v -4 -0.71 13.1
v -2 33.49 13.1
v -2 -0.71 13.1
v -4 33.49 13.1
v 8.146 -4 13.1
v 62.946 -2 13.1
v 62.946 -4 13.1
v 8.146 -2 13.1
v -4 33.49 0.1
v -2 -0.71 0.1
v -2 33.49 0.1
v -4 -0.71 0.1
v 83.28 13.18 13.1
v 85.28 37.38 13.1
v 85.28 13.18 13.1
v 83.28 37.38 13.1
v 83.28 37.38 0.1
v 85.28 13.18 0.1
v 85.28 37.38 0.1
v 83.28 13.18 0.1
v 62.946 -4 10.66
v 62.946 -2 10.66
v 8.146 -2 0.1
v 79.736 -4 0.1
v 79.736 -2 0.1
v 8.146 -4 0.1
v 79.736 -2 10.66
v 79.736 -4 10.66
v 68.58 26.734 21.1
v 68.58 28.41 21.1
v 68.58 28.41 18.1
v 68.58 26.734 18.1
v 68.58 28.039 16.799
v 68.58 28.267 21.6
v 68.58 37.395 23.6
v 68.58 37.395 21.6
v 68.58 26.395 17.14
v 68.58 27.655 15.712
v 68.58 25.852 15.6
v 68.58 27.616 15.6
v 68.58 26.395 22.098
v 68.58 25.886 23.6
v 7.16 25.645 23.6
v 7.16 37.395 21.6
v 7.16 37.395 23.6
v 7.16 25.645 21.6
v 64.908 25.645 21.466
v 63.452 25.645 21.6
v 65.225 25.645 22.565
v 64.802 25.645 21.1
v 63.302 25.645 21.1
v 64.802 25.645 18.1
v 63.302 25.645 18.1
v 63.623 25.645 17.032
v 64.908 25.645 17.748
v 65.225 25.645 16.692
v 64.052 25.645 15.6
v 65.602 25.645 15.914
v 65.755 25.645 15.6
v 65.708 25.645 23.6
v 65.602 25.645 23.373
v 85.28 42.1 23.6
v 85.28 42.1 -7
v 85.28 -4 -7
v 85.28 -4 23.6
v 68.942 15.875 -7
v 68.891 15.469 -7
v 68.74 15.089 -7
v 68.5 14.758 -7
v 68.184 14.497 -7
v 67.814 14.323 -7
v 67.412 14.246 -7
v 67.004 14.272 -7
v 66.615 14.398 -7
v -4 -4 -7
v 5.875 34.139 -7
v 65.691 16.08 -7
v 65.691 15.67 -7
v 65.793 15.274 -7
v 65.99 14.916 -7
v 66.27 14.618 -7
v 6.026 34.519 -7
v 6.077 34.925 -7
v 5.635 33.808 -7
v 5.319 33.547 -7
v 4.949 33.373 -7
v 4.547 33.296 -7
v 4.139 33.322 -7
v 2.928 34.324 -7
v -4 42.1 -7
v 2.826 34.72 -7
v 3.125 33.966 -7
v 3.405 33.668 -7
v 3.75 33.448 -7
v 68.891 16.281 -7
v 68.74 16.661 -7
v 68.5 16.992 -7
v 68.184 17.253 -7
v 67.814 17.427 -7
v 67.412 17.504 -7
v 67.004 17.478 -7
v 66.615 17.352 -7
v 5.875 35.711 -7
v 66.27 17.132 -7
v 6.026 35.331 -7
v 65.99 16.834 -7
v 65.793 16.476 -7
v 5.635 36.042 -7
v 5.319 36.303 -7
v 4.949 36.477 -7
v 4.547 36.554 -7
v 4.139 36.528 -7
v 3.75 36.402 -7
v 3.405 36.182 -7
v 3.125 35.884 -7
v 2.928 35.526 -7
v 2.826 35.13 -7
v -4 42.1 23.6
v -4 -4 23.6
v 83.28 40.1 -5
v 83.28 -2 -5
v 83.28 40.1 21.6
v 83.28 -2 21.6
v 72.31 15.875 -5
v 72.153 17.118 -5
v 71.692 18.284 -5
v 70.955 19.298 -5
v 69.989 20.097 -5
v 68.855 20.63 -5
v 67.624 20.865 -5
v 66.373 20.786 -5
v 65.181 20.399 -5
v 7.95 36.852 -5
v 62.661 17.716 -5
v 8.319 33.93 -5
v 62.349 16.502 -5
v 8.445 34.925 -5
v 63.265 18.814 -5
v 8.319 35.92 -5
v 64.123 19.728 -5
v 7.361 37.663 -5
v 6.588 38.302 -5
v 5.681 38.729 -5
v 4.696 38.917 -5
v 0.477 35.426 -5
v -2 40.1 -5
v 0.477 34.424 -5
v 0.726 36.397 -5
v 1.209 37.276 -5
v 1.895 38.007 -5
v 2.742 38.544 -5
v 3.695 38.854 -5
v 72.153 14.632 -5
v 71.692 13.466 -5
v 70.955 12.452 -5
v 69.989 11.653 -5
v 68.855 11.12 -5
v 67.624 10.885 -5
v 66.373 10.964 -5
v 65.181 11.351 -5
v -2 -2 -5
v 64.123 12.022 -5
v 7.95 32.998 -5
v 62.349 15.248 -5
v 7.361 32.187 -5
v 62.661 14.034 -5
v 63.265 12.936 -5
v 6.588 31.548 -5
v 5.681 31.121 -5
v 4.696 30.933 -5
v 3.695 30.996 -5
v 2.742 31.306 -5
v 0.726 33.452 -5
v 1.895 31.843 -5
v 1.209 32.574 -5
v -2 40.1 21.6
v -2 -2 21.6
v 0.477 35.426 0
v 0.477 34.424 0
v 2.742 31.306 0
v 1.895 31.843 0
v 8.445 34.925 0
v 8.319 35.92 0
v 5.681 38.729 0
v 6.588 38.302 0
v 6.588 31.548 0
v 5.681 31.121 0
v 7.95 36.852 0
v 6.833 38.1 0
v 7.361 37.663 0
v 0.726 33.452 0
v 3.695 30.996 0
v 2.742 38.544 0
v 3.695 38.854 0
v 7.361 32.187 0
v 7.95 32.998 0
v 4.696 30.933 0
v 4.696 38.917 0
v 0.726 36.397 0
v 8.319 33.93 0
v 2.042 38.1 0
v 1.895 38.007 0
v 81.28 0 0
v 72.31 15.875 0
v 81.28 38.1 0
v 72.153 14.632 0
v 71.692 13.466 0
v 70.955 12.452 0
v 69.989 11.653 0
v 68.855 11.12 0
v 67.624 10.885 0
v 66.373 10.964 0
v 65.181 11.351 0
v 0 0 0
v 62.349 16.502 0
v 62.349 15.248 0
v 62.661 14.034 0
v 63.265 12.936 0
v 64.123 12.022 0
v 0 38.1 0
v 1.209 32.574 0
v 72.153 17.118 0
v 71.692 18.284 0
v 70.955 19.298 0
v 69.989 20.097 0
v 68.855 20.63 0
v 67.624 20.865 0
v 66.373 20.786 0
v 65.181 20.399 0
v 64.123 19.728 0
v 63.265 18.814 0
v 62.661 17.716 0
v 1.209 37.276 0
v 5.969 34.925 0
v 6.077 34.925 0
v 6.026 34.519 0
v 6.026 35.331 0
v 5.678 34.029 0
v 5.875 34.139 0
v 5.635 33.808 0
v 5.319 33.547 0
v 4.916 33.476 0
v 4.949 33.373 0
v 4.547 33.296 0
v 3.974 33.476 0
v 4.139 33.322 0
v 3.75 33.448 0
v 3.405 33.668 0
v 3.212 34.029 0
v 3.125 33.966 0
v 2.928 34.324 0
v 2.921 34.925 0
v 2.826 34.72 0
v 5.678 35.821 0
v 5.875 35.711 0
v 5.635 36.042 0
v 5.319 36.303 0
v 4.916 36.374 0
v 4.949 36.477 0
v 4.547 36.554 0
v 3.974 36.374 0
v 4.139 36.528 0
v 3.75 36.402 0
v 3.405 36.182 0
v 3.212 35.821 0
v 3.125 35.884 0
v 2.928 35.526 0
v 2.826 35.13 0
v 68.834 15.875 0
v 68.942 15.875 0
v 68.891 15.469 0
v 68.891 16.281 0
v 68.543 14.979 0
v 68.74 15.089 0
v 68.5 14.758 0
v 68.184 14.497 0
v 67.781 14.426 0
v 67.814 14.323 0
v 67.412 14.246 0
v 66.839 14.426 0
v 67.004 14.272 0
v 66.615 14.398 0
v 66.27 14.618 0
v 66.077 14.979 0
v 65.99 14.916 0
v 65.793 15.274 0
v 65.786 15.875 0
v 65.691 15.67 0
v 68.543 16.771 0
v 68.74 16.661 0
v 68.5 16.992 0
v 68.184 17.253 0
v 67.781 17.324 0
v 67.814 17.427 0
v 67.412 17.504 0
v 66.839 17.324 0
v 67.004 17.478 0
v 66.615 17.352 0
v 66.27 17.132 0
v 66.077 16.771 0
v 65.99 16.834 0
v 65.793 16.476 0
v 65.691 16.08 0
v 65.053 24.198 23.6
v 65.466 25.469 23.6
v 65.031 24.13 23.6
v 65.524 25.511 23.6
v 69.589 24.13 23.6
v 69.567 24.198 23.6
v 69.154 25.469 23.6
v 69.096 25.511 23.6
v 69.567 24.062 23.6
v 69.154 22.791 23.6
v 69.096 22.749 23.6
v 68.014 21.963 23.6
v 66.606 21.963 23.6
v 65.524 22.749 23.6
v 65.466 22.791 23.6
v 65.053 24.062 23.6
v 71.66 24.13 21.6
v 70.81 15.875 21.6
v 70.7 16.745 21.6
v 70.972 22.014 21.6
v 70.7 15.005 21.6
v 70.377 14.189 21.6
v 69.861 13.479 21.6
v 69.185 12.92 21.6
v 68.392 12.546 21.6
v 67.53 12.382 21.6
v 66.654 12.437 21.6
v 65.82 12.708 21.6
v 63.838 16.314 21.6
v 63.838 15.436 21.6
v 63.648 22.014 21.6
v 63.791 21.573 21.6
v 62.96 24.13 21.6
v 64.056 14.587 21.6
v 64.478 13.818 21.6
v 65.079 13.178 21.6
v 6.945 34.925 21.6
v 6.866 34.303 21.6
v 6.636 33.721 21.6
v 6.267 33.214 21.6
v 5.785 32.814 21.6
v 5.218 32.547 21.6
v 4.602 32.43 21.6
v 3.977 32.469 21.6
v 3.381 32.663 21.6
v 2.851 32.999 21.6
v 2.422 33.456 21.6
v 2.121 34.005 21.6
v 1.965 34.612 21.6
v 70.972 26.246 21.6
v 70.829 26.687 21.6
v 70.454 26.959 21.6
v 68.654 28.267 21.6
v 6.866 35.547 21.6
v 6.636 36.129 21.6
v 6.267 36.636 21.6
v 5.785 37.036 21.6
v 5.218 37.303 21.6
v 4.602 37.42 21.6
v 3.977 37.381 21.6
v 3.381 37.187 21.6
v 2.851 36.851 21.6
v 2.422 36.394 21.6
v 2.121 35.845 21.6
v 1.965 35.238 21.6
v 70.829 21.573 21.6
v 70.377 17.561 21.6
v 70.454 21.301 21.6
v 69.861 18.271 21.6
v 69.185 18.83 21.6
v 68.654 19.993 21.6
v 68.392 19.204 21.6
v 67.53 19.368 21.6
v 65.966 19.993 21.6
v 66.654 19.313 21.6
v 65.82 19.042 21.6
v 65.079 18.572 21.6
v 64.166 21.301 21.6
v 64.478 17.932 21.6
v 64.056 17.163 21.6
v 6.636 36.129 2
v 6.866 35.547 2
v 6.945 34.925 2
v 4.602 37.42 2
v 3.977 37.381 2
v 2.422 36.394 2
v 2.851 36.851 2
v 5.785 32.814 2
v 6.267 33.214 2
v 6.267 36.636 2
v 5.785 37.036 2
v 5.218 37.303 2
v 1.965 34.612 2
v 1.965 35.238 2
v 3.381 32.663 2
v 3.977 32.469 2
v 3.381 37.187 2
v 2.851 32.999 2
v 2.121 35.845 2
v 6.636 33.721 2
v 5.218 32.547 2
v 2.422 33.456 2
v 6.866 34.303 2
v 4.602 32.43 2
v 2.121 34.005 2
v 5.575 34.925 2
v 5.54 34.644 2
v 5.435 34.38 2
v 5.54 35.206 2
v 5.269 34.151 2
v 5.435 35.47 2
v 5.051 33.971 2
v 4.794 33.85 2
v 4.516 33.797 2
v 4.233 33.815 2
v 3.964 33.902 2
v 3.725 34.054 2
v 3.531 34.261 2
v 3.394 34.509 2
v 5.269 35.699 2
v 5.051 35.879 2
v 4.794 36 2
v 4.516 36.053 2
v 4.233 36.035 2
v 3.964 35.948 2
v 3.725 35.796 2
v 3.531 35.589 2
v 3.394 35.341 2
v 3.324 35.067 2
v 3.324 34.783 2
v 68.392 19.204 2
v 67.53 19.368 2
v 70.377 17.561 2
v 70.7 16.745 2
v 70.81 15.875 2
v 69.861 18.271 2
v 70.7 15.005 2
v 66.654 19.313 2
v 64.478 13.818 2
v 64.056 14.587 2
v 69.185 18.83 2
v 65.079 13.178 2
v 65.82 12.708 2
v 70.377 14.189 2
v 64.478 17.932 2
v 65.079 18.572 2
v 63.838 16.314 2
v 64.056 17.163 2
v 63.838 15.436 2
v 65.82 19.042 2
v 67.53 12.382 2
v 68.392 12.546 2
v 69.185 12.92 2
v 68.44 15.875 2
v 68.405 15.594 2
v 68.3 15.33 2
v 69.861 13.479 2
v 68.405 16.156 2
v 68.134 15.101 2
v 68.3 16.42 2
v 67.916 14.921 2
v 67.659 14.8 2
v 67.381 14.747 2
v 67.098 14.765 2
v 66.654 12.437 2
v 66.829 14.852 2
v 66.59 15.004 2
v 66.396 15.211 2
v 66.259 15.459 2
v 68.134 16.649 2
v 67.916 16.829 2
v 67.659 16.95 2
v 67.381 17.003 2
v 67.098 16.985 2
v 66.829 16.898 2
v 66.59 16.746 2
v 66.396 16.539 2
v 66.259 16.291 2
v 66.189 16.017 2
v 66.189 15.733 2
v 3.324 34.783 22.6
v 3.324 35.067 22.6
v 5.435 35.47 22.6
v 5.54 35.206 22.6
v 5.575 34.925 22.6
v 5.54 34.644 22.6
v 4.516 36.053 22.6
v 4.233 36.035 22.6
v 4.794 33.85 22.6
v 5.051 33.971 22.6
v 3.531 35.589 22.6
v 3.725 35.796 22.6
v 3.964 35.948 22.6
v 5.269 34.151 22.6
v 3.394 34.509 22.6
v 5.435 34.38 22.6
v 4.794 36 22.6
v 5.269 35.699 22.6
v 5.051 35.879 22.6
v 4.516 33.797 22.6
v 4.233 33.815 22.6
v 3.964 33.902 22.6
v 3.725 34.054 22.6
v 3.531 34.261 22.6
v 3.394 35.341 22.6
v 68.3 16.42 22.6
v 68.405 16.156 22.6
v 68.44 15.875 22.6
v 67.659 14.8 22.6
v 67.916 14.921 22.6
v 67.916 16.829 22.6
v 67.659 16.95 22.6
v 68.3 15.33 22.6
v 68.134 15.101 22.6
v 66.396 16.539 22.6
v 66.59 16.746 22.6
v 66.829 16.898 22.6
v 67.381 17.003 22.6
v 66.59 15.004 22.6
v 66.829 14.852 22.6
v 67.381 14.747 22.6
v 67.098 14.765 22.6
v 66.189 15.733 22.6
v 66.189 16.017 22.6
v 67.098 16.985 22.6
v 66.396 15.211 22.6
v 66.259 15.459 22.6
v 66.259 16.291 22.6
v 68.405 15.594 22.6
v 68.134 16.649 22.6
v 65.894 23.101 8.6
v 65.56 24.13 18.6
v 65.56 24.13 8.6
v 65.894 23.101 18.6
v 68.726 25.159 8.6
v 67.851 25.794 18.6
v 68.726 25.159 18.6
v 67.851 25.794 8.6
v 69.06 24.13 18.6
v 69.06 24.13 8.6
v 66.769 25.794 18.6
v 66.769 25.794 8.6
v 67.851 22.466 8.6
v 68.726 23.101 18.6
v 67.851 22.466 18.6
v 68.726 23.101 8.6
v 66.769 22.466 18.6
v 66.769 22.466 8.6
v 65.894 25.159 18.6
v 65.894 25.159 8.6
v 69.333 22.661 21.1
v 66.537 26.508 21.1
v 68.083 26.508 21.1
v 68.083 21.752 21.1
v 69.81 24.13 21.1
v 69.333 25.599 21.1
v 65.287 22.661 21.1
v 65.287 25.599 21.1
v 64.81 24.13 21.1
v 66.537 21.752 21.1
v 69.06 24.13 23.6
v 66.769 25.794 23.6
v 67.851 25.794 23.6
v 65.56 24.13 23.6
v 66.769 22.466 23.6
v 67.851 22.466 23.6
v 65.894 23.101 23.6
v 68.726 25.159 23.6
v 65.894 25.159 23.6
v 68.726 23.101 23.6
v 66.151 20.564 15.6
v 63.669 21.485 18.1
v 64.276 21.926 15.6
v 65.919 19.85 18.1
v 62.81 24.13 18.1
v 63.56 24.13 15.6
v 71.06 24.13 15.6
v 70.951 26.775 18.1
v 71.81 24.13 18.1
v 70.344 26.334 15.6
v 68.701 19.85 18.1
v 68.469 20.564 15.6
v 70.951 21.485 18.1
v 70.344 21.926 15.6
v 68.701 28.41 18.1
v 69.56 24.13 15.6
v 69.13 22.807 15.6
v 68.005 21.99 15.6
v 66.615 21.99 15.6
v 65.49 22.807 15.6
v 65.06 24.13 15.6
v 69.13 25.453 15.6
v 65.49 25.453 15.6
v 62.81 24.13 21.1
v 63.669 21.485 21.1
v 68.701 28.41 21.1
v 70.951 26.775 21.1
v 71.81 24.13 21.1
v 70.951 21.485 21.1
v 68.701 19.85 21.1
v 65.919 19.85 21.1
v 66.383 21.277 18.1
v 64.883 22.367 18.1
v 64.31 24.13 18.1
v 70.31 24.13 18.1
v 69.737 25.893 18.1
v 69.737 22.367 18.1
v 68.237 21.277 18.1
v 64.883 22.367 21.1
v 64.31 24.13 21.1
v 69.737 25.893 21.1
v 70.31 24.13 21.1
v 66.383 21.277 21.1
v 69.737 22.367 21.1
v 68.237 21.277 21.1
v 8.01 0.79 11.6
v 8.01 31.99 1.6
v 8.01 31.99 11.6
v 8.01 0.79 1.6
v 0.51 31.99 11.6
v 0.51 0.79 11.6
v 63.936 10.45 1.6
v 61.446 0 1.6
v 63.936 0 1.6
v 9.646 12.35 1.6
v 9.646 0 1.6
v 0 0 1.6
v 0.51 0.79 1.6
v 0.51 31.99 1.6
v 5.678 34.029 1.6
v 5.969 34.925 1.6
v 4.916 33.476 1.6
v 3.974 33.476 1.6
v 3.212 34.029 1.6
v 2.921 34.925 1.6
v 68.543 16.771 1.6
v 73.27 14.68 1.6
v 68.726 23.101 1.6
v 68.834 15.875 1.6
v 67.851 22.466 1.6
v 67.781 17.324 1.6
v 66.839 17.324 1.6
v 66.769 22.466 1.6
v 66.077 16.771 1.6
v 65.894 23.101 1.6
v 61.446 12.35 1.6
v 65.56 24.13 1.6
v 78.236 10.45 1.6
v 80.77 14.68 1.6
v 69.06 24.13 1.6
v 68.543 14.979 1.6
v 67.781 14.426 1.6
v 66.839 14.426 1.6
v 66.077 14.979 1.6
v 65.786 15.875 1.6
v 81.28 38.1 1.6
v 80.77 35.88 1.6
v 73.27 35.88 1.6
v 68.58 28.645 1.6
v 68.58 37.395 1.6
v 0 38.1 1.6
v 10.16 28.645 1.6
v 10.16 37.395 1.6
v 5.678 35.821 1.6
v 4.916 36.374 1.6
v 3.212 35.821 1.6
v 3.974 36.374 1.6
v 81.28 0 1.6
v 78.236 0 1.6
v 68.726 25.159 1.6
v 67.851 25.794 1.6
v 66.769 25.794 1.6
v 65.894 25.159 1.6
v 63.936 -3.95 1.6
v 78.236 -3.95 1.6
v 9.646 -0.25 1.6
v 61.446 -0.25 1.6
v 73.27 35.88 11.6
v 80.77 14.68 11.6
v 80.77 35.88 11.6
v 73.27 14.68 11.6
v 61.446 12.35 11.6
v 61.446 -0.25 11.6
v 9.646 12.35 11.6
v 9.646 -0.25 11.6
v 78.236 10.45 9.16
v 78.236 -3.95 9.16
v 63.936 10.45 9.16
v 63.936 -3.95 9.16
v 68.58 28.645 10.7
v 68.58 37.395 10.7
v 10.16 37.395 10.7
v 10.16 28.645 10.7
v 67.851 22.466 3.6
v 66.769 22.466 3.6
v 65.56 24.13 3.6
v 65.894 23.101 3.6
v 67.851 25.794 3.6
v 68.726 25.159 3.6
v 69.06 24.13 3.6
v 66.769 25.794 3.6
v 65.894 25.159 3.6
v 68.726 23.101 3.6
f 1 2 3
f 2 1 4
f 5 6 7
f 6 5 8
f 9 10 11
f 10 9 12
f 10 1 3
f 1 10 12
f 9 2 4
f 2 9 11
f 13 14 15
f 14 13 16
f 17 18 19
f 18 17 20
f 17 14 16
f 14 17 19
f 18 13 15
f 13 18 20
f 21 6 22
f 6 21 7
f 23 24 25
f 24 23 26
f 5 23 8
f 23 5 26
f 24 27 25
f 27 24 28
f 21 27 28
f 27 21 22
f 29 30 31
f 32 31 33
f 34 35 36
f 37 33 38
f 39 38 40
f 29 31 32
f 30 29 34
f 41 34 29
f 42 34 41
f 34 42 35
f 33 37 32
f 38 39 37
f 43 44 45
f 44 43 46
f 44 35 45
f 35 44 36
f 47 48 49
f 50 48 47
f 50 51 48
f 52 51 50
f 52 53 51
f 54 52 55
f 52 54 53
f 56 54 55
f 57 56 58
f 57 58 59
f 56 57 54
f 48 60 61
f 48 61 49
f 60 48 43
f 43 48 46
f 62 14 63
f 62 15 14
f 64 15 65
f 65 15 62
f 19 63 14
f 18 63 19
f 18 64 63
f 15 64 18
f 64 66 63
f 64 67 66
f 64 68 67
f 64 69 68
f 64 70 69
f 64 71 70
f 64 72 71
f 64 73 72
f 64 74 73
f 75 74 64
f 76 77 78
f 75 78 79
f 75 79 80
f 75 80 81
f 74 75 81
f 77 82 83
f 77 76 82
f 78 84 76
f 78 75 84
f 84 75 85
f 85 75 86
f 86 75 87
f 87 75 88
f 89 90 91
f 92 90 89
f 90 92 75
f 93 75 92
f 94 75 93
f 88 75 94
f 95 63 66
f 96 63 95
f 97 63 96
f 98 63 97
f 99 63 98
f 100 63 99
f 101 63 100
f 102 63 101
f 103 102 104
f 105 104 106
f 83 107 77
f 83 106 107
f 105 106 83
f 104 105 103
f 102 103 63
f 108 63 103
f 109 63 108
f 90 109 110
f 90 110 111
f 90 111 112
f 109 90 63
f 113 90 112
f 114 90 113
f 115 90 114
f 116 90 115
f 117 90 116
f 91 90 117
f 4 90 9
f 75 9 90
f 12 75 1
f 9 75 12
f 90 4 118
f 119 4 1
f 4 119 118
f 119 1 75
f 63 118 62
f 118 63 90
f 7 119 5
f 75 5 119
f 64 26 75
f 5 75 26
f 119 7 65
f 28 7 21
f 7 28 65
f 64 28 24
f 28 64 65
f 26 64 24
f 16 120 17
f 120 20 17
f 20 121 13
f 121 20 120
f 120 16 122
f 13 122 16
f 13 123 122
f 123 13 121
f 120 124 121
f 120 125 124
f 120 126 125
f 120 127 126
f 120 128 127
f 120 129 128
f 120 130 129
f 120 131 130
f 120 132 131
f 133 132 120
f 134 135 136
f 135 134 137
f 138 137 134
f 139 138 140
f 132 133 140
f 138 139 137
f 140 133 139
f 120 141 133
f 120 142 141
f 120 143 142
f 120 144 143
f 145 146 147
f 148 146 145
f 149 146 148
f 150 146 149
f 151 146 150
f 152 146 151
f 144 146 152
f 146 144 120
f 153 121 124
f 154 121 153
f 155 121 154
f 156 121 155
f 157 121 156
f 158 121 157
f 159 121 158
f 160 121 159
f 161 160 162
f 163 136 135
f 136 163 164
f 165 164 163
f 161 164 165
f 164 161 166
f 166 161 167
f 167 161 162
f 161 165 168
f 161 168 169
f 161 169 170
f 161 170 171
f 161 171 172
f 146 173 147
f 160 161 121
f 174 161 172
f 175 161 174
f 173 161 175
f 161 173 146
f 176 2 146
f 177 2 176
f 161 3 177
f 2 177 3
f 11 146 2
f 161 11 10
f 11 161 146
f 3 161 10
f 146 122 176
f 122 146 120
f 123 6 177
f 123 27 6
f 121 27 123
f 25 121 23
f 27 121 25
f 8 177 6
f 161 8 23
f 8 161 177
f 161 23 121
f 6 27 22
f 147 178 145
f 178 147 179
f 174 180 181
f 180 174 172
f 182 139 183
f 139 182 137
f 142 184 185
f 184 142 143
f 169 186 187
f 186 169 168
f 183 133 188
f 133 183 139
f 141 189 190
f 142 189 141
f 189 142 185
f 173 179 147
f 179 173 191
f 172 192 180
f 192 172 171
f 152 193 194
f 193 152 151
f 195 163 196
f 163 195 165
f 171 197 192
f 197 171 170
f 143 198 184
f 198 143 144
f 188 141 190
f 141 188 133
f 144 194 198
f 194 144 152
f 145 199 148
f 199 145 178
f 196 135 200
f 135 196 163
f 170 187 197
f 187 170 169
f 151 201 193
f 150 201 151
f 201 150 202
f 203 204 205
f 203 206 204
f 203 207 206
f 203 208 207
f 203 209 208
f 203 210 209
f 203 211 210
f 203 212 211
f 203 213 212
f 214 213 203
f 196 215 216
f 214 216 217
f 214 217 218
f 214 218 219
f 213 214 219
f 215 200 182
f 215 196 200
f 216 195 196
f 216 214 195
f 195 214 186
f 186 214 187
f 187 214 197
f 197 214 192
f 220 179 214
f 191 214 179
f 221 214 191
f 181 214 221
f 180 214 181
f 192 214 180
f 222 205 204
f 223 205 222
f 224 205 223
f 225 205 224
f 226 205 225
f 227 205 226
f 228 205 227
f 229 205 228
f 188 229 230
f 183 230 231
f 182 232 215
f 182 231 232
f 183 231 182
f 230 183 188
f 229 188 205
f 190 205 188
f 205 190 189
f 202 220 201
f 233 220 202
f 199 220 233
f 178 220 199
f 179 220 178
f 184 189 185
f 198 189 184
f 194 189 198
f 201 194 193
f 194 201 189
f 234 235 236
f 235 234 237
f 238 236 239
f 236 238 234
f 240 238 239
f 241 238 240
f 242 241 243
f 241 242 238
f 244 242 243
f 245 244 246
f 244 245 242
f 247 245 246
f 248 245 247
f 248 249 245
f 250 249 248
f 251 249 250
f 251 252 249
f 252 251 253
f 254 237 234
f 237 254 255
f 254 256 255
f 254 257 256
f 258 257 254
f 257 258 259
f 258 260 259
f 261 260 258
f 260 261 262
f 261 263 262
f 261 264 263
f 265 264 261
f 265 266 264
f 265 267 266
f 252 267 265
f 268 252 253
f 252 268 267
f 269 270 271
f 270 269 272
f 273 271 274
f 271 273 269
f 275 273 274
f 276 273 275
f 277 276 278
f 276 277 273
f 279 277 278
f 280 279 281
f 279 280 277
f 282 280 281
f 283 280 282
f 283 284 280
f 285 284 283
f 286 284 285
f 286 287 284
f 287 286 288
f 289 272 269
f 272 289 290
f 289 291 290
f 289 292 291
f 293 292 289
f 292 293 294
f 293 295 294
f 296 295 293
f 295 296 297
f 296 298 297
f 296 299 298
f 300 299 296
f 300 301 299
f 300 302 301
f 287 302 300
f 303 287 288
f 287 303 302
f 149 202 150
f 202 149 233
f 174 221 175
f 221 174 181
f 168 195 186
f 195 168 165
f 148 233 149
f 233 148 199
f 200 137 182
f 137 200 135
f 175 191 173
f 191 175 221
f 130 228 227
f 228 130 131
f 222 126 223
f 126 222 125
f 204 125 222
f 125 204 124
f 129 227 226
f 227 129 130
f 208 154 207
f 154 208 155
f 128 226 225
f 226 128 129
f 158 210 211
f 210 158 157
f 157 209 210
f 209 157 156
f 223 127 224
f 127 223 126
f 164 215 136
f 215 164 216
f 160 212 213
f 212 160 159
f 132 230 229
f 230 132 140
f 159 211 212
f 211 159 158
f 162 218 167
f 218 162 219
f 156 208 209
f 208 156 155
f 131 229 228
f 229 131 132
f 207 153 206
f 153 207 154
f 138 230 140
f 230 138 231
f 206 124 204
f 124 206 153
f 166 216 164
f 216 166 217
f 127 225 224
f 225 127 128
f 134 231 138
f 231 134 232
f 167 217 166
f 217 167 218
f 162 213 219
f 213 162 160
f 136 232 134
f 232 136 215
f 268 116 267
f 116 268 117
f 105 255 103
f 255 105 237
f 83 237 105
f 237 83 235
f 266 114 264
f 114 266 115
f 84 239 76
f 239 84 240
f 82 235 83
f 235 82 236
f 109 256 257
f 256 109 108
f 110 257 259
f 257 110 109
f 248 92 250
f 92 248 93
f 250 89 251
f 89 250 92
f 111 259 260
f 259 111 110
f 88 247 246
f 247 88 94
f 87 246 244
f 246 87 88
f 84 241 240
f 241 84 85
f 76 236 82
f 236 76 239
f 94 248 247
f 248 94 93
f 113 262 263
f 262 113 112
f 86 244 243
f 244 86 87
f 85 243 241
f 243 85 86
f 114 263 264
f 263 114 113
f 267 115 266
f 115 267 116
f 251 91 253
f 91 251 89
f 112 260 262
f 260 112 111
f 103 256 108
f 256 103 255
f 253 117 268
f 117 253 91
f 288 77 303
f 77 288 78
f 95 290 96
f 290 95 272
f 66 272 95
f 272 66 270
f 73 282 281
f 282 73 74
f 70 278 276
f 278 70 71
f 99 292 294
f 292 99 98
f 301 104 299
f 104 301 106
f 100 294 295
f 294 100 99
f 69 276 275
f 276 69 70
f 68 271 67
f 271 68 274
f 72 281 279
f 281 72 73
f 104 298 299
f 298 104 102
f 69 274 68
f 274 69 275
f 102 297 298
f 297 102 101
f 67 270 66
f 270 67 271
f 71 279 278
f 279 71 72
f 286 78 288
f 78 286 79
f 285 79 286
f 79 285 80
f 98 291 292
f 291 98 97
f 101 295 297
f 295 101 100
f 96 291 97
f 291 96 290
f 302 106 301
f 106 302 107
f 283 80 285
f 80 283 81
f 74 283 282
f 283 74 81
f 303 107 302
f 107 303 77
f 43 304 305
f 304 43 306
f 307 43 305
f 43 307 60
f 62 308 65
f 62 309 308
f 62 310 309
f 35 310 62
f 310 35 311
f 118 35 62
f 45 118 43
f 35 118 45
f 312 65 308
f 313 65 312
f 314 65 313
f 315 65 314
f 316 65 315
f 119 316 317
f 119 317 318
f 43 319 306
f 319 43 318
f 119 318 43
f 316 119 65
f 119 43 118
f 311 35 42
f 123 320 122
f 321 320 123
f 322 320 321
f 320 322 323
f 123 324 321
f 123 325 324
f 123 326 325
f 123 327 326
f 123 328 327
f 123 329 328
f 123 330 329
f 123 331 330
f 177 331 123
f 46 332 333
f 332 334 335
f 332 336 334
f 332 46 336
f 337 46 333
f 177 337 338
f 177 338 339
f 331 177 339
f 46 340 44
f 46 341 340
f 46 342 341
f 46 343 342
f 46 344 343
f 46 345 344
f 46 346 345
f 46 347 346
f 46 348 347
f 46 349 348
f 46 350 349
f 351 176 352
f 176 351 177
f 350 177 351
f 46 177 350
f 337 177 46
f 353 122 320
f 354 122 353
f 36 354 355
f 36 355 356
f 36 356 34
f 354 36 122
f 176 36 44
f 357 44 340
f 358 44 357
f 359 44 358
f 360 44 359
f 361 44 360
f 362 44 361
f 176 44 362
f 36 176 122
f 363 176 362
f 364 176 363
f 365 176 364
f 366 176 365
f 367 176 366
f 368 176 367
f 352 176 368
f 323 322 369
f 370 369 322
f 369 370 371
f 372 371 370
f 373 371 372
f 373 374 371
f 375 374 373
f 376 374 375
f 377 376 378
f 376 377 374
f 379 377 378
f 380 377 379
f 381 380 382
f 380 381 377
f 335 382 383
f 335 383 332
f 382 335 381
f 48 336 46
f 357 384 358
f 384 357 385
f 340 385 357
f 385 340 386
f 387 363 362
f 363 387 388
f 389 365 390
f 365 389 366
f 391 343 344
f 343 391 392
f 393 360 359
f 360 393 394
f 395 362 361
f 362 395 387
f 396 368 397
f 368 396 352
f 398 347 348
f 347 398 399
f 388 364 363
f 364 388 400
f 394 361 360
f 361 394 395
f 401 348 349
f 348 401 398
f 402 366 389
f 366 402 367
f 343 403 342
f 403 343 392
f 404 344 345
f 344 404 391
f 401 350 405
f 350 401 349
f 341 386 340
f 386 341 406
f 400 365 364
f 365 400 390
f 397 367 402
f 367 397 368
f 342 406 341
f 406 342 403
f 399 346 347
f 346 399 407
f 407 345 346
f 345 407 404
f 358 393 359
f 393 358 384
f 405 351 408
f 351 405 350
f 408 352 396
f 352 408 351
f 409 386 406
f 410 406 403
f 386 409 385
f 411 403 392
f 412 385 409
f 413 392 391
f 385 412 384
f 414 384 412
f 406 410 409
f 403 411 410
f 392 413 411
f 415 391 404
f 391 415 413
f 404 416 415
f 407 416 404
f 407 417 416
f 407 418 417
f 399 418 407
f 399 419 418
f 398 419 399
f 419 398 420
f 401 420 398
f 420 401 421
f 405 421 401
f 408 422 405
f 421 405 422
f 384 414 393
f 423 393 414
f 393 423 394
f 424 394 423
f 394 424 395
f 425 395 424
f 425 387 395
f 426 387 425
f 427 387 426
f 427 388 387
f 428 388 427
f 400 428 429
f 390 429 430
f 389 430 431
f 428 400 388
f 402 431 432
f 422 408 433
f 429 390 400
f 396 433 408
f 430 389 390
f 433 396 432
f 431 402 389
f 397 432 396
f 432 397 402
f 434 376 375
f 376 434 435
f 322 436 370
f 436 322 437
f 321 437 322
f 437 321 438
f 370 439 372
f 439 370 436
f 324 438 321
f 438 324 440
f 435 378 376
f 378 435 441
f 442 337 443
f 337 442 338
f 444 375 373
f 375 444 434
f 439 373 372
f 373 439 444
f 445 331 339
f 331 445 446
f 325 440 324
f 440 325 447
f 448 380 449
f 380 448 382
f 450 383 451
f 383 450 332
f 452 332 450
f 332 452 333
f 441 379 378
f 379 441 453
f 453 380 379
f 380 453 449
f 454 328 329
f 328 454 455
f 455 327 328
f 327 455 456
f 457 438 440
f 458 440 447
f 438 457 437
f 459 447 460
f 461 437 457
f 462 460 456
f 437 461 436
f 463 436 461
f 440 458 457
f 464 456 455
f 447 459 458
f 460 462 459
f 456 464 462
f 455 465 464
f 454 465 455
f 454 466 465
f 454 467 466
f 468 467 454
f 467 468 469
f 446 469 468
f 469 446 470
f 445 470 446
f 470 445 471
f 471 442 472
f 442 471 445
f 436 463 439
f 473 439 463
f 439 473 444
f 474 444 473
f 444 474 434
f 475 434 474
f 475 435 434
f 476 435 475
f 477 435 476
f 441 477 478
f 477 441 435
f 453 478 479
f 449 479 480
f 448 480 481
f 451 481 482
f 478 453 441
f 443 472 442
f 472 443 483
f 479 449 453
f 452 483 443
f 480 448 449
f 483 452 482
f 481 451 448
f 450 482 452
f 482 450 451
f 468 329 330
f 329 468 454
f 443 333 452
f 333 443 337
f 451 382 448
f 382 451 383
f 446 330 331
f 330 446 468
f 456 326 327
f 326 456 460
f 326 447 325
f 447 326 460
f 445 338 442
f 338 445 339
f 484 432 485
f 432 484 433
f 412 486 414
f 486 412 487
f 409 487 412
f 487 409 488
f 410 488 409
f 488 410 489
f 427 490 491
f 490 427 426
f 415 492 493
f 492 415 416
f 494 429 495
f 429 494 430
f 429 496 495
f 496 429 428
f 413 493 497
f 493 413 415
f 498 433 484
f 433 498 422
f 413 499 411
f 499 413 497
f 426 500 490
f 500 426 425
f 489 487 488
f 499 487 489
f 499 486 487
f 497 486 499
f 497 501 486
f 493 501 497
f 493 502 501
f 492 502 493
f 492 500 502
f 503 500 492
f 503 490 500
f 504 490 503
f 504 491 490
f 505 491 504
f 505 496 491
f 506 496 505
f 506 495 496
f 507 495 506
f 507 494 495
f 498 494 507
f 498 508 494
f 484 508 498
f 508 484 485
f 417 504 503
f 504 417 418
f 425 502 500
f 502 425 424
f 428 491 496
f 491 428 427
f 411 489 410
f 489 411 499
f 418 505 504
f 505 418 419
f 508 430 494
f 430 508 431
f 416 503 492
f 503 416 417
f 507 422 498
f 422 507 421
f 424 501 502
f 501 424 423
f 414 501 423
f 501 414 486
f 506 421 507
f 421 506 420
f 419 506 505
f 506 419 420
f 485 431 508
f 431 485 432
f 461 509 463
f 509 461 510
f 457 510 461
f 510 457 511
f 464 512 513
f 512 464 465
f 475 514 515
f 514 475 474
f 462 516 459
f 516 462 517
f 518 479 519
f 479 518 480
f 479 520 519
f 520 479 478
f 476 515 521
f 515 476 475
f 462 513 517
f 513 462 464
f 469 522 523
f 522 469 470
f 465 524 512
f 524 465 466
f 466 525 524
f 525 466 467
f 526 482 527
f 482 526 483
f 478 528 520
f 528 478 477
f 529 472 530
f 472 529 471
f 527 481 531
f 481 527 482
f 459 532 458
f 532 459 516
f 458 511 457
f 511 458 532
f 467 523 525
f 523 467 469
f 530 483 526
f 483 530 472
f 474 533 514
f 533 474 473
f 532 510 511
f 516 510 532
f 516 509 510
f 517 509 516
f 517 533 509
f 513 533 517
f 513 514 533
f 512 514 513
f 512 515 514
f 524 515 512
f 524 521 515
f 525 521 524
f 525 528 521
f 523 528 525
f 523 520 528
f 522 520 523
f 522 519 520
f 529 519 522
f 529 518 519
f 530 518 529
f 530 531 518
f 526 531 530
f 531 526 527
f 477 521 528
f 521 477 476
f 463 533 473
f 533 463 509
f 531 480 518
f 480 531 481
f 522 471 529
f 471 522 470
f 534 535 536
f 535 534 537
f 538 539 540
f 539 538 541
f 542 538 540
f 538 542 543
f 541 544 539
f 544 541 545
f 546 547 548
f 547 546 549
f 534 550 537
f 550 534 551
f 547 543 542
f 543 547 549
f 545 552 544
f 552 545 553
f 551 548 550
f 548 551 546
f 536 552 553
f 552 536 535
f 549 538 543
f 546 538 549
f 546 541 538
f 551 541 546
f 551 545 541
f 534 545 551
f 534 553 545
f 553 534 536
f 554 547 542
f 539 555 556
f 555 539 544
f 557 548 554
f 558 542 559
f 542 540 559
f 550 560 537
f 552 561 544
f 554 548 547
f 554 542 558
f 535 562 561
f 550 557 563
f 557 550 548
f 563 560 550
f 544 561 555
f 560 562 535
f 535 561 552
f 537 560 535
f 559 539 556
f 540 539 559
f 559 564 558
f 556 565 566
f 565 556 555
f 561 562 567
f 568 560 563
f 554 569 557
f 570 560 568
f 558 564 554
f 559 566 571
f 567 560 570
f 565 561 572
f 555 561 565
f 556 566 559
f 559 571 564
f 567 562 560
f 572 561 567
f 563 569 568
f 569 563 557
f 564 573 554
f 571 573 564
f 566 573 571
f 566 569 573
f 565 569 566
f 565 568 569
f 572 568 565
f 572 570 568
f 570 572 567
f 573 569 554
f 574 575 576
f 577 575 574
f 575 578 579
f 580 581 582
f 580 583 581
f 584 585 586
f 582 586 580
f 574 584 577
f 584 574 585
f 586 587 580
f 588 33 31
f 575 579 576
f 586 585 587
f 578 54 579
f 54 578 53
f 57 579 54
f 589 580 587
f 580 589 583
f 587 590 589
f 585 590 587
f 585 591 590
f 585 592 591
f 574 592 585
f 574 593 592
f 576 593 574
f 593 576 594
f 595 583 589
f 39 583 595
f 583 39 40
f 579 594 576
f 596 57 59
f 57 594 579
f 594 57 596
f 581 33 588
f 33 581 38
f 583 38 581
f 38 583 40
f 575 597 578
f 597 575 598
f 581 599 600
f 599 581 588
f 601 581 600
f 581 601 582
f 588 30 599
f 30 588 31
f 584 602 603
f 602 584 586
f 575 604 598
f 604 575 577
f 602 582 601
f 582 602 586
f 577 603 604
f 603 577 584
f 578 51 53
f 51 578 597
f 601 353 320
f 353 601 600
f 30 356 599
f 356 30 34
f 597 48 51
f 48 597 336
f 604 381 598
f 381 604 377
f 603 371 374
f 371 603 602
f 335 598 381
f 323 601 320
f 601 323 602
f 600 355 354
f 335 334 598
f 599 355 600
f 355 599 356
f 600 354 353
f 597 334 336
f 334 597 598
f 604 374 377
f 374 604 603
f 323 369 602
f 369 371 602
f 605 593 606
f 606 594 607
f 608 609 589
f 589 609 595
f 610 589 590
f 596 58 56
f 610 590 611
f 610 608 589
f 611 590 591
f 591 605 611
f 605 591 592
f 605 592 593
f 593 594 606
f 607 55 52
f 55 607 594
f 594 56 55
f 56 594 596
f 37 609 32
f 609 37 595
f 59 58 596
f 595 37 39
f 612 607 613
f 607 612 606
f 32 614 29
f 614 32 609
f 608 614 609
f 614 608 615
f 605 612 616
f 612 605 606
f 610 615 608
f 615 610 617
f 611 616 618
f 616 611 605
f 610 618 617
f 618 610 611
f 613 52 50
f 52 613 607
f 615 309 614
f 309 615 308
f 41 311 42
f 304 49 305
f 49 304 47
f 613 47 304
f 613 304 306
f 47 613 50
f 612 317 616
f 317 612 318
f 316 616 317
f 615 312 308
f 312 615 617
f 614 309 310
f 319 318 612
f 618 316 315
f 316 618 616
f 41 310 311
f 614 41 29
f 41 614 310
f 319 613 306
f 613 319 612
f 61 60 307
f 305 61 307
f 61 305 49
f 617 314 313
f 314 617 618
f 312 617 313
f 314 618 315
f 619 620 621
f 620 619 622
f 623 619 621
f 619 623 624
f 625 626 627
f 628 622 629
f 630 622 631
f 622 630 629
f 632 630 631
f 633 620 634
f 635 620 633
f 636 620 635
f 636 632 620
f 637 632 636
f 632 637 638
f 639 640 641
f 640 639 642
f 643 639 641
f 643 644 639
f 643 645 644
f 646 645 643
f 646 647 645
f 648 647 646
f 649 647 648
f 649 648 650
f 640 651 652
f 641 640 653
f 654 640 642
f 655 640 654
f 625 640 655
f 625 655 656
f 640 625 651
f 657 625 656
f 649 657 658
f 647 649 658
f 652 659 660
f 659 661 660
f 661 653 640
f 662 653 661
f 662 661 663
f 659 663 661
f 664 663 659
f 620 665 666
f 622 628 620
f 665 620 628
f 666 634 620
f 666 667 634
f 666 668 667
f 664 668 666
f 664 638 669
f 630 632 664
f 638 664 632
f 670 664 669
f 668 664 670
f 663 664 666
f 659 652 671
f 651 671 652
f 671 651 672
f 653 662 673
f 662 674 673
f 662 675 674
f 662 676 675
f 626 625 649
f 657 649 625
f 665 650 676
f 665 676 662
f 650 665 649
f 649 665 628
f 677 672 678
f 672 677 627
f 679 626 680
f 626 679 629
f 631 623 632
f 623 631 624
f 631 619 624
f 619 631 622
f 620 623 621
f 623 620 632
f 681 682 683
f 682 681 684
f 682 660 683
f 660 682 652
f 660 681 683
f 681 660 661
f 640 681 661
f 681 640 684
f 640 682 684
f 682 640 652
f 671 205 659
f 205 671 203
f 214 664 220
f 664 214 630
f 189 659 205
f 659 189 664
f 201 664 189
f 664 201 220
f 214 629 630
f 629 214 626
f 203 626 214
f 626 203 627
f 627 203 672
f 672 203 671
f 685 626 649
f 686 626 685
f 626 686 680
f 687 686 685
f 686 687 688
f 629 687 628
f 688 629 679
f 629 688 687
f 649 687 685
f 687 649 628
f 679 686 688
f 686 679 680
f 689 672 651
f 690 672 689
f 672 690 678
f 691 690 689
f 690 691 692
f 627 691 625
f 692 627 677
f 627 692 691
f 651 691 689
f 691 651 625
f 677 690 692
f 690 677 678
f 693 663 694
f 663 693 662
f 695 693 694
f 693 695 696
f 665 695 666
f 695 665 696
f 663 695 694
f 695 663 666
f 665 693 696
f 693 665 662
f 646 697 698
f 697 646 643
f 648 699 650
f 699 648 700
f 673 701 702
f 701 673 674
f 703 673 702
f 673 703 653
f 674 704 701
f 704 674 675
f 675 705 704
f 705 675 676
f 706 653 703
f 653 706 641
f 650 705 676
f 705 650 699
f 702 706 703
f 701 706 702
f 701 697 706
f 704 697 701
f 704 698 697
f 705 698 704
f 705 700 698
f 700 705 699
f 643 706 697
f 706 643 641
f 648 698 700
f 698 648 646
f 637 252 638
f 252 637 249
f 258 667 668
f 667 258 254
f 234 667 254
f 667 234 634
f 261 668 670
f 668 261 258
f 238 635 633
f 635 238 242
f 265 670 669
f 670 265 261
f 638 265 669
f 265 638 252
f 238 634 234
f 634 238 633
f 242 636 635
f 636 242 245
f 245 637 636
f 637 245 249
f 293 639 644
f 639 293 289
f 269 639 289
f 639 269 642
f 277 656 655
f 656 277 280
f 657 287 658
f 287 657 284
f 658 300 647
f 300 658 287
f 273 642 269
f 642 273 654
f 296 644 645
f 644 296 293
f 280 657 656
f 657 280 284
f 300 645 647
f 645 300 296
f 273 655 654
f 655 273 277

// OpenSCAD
/* Enclosures for ATX board projects */
// dimensions relative to eagle, so origin is
// lower-left corner of PCB.

/* [Global] */
// This design is composed of a number of separate printable parts:
part = "1_all"; // [1_top:RPi Box Top,1_bottom:RPi Box Bottom,1_all:RPi Box Assembled, 2_top:ATX Power Box Top,2_bottom:ATX Power Box Bottom,2_all:ATX Power Box Assembled]

/* [Hidden] */

function inch() = 25.4;
function standoff1() = [.175*inch(), 1.375*inch(), 0];
function standoff2() = [2.65*inch(), .625*inch(), 0];
function button() = [2.65*inch(), 0.95*inch(), 0];


main(part);

module main(part="2_all") {
  if (part=="1_bottom" || part=="1_all") {
    rpi_box_bottom();
  }
  if (part=="1_top" || part=="1_all") {
    rpi_box_top();
  }
  if (part=="1_pcb" || part=="1_all") {
    board();
  }
  if (part=="2_bottom" || part=="2_all") {
    power_box_bottom();
  }
  if (part=="2_top" || part=="2_all") {
    power_box_top();
  }
  if (part=="2_pcb" || part=="2_all") {
    board(atx=true, usb=false, rpi=false, button=false, screw=false);
  }
  if (part=="2_all") {
    rocker();
  }
}

module rpi_box_top(spaceup=20) {
  intersection() {
    rpi_box(spaceup=spaceup);
    splitter();
  }
  push_button(spaceup=spaceup);
  difference() {
    push_button(outer=true, c=2, short=true, spaceup=spaceup);
    push_button(outer=true, c=0.5, e=.1, spaceup=spaceup);
    rpi_connector(extra=spaceup+10, clearance=1.5);
  }
}

module rpi_box_bottom() {
  difference() {
    rpi_box();
    splitter();
  }
}

module splitter() {
  translate([-100,-100,1])
    cube([200,200,200]);
}

module rpi_box(thick=2, spaceup=15 /* should be >10 */,
           atx=true, usb=true, rpi=true, button=true, screw=true) {
  spacexy=2; spacedown=5;
  difference() {
    union() {
      difference() {
        translate([-spacexy-thick,-spacexy-thick,-spacedown-thick])
          cube([3.2*inch()+2*spacexy+2*thick, 1.5*inch()+2*spacexy+2*thick, spacedown+1.6+spaceup+2*thick]);
        // hollow out
        translate([-spacexy,-spacexy,-spacedown])
          cube([3.2*inch()+2*spacexy, 1.5*inch()+2*spacexy, spacedown+1.6+spaceup]);

        // space around connectors, etc
        board(extra=30, clearance=1.5, atx=atx, usb=usb, rpi=rpi, button=button, screw=screw);
      }
      standoffs(spacedown=spacedown, spaceup=spaceup, thick=thick, holes=false);
    }
    standoffs(spacedown=spacedown, spaceup=spaceup, thick=thick, holes=true);
  }
}

module standoffs(spacedown=5, spaceup=15, thick=2, holes=false) {
  four_tap = .0890*inch(); // tap drill for a #4-40 screw
  four_clear = .1285*inch(); // clearance drill for a #4 screw
  c = holes ? thick/2 + .1 : 0; c2 = 2*c;
  res=25;
  // standoffs
  translate(standoff1()+[0,0,-spacedown-thick/2-c])
    cylinder(d=holes?four_clear:8, h=spacedown+thick/2+c2, $fn=res);
  translate(standoff2()+[0,0,-spacedown-thick/2-c])
    cylinder(d=holes?four_clear:10, h=spacedown+thick/2+c2, $fn=res);
  translate(standoff1()+[0,0,2-c])
    cylinder(d=holes?four_tap:5, h=1.6+spaceup-2+thick/2+c, $fn=res);
  translate(standoff2()+[0,0,2-c])
    cylinder(d=holes?four_tap:7, h=1.6+spaceup-2+thick/2+c, $fn=res);
}

module board(extra=0, clearance=0, atx=true, usb=true, rpi=true, button=true, screw=true) {
  c=clearance; c2=2*clearance;
  difference() {
    union() {
      // pcb
      pcb_board(clearance=c);
      // atx connector
      if (atx) { atx_connector(extra=extra, clearance=c); }
      // usb connector
      if (usb) { usb_connector(extra=extra, clearance=c); }
      // raspberry pi connector
      if (rpi) { rpi_connector(extra=extra, clearance=c); }
      // shutdown button
      if (button) { shutdown_button(extra=extra, clearance=c); }
      // powertail cable, etc
      if (screw) { power_out(extra=extra, clearance=c); }
    }
    if (extra==0) {
      // mounting holes
      translate(standoff1()+[0,0,-1])
        cylinder(d=.12*inch() /*#4*/, h=3, $fn=10);
      translate(standoff2()+[0,0,-1])
        cylinder(d=.12*inch() /*#4*/, h=3, $fn=10);
    }
  }
}

module pcb_board(clearance=0) {
  c=clearance; c2=2*clearance;
  color("purple")
    translate([-c,-c,-c])
      cube([3.2*inch()+c2, 1.5*inch()+c2, 1.6+c2]);
}

module atx_connector(extra=0, clearance=0) {
  c=clearance; c2=2*clearance;
  translate([.49*inch()-c, .25*inch()-extra-c, 1.6-c])// to mounting hole
    // from data sheet
    translate([(46.2-51.8)/2, -6.6, 0])
      cube([51.8+c2, 12.6+extra+c2, 10+c2]);
}

module usb_connector(extra=0, clearance=0) {
  c=clearance; c2=2*clearance;
  translate([2.54*inch()-c, .25*inch()-extra-c, 1.6-c]) // to mounting hole
    // from data sheet
    translate([(13.14-14.3)/2,-10.3,0])
      cube([14.3+c2,14.4+extra+c2,c2+1.5+5.12+(7-5.12)/2]);
}

module rpi_connector(extra=0, clearance=0) {
  c=clearance; c2=2*clearance;
  translate([1.55*inch()-c, 1.3*inch()-c, 1.6-c]) // to center of PCB pins
    translate([0,0,(9.1+extra+c2)/2])
      cube([58.42+c2,8.75+c2,9.1+extra+c2], center=true);
}

module shutdown_button(extra=0, clearance=0) {
  c=clearance; c2=2*clearance;
  translate(button()+[0, 0, 1.6-c]) // to center of switch
    cylinder(d=3.5+c2, h=2+extra+c2, $fn=10);
}

module push_button(spaceup=15, thick=2, outer=false, short=false, c=0, e=0) {
  buttop=1.6 + 7;// top of button is 7mm up from board
  boxtop=1.6 + spaceup + thick;
  keeper=5; // 5mm keeper
  travel=outer ? 3 : 0; // 3mm max travel
  c2 = 2*c;
  res=10;
  translate(button()) {
    if (!short) {
      translate([0,0,buttop-e])
        cylinder(d=3.5+c2, h=boxtop-(buttop-e)-keeper-travel, $fn=res);
    }
    translate([0,0,boxtop-keeper-travel])
      cylinder(d1=3.5+c2, d2=5+c2, h=keeper/2, $fn=res);
    if (travel > 0) {
      translate([0,0,boxtop-keeper/2-travel])
        cylinder(d=5+c2, h=travel, $fn=res);
    }
    translate([0,0,boxtop-keeper/2])
      cylinder(d1=5+c2, d2=3.5+c2, h=keeper/2 + e, $fn=res);
  }
}

module power_out(extra=0, clearance=0) {
  // power tail
  translate([0.15*inch(), 0.35*inch(), 1.6])
    screw_terminal(extra=extra,clearance=clearance);
  // +12V (1)
  translate([0.15*inch(), 0.7437*inch(), 1.6])
    screw_terminal(extra=extra,clearance=clearance);
  // +12V (2)
  translate([0.15*inch(), 1.1374*inch(), 1.6])
    screw_terminal(extra=extra,clearance=clearance);
  // +3.3V
  translate([3.05*inch(), 1.0937*inch(), 1.6])
    rotate([0,0,180])
    screw_terminal(extra=extra,clearance=clearance);
  // +5V
  translate([3.05*inch(), 0.7*inch(), 1.6])
    rotate([0,0,180])
    screw_terminal(extra=extra,clearance=clearance);
}

module screw_terminal(extra=0,clearance=0) {
  c=clearance; c2=2*clearance;
  front=7.5-4.2;
  translate([-front-extra-c,-(5+3.1)-c,-c])
    cube([7.5+extra+c2,3.1+5+3.1+c2,10+c2]);
}

module bananas(h=10, spacexy=2, thick=2, hole=true) {
  cl=.008*inch(); res=40;
  translate([32,1.5*inch()+spacexy+thick,18]) rotate([-90,0,0])
  // two rows of three, on standard .75 in spacing
  for (x=[-1,0,1]) {
    for (y=[-.5,.5]) {
      translate([x*.75*inch(), y*.75*inch(), 0]) {
        intersection() {
          cylinder(d=.298*inch() + cl, h=h, center=true, $fn=res);
          cube([.265*inch() + cl, .4*inch() + cl, h + 1], center=true);
        }
      }
    }
  }
}

module rocker(h=10, spacexy=2, thick=2, hole=false) {
  cl=.008*inch(); res=40;
  translate([2.8*inch()+1,1.5*inch()+spacexy+thick,18]) rotate([-90,-90,0])
  if (hole) {
    cylinder(d=20.2+cl, h=h, center=true, $fn=res);
    translate([-.079*inch()/2,0,-h/2])
      cube([.079*inch()+cl, ((.822-.778) + .778/2)*inch() + cl, h]);
  } else {
    cylinder(d=.901*inch(), h=.18*inch(), $fn=res);
    translate([0,0,-.185*inch()])
      cylinder(d=.779*inch(), h=.19*inch(), $fn=res);
    translate([0,0,-.3*inch()])
      cube([.661*inch(), .469*inch(), .6*inch()], center=true);
  }
}

module power_box(spaceup=33) {
  thick=2;
  difference() {
    rpi_box(thick=thick, spaceup=spaceup, atx=true, usb=false, rpi=false, button=false, screw=false);
    rocker(hole=true);
    bananas();
  }
  // reinforcement
  difference() {
    union() {
      translate(standoff1()+[-8,-3,16.6]) cube([10,9.5,19.5]);
      translate(standoff2()+[-2.5,-19,16.6]) cube([19.5,21.4,19.5]);
    }
    standoffs(spaceup=spaceup, holes=true);
    translate(standoff2()+[7,-9,16]) #cylinder(d=15, h=19);
  }
}

module power_box_top() {
  difference() {
    power_box();
    splitter2();
  }
}

module power_box_bottom() {
  intersection() {
    power_box();
    splitter2();
  }
}

module splitter2(spacexy=2, spaceup=33, thick=2) {
  large=50; e=.02;
  difference() {
    translate([-spacexy-thick-1,0,0])
      scale([1,1,-1])
      rotate([0,90,0])
      linear_extrude(height=3.2*inch()+2*spacexy+2*thick+2)
      // x coordinate is z here.
      polygon(points=[[-large,-large],[1,-large],[1,-spacexy],[1.6+spaceup,1.5*inch()+spacexy-0.1],[1.6+spaceup,large],[-large,large]]);
    translate([-spacexy+e,-spacexy+e,1])
      cube([3.2*inch()+2*spacexy -2*e, 1.5*inch()+2*spacexy -2*e, 1.6 + spaceup - 1 + e]);
  }
}
